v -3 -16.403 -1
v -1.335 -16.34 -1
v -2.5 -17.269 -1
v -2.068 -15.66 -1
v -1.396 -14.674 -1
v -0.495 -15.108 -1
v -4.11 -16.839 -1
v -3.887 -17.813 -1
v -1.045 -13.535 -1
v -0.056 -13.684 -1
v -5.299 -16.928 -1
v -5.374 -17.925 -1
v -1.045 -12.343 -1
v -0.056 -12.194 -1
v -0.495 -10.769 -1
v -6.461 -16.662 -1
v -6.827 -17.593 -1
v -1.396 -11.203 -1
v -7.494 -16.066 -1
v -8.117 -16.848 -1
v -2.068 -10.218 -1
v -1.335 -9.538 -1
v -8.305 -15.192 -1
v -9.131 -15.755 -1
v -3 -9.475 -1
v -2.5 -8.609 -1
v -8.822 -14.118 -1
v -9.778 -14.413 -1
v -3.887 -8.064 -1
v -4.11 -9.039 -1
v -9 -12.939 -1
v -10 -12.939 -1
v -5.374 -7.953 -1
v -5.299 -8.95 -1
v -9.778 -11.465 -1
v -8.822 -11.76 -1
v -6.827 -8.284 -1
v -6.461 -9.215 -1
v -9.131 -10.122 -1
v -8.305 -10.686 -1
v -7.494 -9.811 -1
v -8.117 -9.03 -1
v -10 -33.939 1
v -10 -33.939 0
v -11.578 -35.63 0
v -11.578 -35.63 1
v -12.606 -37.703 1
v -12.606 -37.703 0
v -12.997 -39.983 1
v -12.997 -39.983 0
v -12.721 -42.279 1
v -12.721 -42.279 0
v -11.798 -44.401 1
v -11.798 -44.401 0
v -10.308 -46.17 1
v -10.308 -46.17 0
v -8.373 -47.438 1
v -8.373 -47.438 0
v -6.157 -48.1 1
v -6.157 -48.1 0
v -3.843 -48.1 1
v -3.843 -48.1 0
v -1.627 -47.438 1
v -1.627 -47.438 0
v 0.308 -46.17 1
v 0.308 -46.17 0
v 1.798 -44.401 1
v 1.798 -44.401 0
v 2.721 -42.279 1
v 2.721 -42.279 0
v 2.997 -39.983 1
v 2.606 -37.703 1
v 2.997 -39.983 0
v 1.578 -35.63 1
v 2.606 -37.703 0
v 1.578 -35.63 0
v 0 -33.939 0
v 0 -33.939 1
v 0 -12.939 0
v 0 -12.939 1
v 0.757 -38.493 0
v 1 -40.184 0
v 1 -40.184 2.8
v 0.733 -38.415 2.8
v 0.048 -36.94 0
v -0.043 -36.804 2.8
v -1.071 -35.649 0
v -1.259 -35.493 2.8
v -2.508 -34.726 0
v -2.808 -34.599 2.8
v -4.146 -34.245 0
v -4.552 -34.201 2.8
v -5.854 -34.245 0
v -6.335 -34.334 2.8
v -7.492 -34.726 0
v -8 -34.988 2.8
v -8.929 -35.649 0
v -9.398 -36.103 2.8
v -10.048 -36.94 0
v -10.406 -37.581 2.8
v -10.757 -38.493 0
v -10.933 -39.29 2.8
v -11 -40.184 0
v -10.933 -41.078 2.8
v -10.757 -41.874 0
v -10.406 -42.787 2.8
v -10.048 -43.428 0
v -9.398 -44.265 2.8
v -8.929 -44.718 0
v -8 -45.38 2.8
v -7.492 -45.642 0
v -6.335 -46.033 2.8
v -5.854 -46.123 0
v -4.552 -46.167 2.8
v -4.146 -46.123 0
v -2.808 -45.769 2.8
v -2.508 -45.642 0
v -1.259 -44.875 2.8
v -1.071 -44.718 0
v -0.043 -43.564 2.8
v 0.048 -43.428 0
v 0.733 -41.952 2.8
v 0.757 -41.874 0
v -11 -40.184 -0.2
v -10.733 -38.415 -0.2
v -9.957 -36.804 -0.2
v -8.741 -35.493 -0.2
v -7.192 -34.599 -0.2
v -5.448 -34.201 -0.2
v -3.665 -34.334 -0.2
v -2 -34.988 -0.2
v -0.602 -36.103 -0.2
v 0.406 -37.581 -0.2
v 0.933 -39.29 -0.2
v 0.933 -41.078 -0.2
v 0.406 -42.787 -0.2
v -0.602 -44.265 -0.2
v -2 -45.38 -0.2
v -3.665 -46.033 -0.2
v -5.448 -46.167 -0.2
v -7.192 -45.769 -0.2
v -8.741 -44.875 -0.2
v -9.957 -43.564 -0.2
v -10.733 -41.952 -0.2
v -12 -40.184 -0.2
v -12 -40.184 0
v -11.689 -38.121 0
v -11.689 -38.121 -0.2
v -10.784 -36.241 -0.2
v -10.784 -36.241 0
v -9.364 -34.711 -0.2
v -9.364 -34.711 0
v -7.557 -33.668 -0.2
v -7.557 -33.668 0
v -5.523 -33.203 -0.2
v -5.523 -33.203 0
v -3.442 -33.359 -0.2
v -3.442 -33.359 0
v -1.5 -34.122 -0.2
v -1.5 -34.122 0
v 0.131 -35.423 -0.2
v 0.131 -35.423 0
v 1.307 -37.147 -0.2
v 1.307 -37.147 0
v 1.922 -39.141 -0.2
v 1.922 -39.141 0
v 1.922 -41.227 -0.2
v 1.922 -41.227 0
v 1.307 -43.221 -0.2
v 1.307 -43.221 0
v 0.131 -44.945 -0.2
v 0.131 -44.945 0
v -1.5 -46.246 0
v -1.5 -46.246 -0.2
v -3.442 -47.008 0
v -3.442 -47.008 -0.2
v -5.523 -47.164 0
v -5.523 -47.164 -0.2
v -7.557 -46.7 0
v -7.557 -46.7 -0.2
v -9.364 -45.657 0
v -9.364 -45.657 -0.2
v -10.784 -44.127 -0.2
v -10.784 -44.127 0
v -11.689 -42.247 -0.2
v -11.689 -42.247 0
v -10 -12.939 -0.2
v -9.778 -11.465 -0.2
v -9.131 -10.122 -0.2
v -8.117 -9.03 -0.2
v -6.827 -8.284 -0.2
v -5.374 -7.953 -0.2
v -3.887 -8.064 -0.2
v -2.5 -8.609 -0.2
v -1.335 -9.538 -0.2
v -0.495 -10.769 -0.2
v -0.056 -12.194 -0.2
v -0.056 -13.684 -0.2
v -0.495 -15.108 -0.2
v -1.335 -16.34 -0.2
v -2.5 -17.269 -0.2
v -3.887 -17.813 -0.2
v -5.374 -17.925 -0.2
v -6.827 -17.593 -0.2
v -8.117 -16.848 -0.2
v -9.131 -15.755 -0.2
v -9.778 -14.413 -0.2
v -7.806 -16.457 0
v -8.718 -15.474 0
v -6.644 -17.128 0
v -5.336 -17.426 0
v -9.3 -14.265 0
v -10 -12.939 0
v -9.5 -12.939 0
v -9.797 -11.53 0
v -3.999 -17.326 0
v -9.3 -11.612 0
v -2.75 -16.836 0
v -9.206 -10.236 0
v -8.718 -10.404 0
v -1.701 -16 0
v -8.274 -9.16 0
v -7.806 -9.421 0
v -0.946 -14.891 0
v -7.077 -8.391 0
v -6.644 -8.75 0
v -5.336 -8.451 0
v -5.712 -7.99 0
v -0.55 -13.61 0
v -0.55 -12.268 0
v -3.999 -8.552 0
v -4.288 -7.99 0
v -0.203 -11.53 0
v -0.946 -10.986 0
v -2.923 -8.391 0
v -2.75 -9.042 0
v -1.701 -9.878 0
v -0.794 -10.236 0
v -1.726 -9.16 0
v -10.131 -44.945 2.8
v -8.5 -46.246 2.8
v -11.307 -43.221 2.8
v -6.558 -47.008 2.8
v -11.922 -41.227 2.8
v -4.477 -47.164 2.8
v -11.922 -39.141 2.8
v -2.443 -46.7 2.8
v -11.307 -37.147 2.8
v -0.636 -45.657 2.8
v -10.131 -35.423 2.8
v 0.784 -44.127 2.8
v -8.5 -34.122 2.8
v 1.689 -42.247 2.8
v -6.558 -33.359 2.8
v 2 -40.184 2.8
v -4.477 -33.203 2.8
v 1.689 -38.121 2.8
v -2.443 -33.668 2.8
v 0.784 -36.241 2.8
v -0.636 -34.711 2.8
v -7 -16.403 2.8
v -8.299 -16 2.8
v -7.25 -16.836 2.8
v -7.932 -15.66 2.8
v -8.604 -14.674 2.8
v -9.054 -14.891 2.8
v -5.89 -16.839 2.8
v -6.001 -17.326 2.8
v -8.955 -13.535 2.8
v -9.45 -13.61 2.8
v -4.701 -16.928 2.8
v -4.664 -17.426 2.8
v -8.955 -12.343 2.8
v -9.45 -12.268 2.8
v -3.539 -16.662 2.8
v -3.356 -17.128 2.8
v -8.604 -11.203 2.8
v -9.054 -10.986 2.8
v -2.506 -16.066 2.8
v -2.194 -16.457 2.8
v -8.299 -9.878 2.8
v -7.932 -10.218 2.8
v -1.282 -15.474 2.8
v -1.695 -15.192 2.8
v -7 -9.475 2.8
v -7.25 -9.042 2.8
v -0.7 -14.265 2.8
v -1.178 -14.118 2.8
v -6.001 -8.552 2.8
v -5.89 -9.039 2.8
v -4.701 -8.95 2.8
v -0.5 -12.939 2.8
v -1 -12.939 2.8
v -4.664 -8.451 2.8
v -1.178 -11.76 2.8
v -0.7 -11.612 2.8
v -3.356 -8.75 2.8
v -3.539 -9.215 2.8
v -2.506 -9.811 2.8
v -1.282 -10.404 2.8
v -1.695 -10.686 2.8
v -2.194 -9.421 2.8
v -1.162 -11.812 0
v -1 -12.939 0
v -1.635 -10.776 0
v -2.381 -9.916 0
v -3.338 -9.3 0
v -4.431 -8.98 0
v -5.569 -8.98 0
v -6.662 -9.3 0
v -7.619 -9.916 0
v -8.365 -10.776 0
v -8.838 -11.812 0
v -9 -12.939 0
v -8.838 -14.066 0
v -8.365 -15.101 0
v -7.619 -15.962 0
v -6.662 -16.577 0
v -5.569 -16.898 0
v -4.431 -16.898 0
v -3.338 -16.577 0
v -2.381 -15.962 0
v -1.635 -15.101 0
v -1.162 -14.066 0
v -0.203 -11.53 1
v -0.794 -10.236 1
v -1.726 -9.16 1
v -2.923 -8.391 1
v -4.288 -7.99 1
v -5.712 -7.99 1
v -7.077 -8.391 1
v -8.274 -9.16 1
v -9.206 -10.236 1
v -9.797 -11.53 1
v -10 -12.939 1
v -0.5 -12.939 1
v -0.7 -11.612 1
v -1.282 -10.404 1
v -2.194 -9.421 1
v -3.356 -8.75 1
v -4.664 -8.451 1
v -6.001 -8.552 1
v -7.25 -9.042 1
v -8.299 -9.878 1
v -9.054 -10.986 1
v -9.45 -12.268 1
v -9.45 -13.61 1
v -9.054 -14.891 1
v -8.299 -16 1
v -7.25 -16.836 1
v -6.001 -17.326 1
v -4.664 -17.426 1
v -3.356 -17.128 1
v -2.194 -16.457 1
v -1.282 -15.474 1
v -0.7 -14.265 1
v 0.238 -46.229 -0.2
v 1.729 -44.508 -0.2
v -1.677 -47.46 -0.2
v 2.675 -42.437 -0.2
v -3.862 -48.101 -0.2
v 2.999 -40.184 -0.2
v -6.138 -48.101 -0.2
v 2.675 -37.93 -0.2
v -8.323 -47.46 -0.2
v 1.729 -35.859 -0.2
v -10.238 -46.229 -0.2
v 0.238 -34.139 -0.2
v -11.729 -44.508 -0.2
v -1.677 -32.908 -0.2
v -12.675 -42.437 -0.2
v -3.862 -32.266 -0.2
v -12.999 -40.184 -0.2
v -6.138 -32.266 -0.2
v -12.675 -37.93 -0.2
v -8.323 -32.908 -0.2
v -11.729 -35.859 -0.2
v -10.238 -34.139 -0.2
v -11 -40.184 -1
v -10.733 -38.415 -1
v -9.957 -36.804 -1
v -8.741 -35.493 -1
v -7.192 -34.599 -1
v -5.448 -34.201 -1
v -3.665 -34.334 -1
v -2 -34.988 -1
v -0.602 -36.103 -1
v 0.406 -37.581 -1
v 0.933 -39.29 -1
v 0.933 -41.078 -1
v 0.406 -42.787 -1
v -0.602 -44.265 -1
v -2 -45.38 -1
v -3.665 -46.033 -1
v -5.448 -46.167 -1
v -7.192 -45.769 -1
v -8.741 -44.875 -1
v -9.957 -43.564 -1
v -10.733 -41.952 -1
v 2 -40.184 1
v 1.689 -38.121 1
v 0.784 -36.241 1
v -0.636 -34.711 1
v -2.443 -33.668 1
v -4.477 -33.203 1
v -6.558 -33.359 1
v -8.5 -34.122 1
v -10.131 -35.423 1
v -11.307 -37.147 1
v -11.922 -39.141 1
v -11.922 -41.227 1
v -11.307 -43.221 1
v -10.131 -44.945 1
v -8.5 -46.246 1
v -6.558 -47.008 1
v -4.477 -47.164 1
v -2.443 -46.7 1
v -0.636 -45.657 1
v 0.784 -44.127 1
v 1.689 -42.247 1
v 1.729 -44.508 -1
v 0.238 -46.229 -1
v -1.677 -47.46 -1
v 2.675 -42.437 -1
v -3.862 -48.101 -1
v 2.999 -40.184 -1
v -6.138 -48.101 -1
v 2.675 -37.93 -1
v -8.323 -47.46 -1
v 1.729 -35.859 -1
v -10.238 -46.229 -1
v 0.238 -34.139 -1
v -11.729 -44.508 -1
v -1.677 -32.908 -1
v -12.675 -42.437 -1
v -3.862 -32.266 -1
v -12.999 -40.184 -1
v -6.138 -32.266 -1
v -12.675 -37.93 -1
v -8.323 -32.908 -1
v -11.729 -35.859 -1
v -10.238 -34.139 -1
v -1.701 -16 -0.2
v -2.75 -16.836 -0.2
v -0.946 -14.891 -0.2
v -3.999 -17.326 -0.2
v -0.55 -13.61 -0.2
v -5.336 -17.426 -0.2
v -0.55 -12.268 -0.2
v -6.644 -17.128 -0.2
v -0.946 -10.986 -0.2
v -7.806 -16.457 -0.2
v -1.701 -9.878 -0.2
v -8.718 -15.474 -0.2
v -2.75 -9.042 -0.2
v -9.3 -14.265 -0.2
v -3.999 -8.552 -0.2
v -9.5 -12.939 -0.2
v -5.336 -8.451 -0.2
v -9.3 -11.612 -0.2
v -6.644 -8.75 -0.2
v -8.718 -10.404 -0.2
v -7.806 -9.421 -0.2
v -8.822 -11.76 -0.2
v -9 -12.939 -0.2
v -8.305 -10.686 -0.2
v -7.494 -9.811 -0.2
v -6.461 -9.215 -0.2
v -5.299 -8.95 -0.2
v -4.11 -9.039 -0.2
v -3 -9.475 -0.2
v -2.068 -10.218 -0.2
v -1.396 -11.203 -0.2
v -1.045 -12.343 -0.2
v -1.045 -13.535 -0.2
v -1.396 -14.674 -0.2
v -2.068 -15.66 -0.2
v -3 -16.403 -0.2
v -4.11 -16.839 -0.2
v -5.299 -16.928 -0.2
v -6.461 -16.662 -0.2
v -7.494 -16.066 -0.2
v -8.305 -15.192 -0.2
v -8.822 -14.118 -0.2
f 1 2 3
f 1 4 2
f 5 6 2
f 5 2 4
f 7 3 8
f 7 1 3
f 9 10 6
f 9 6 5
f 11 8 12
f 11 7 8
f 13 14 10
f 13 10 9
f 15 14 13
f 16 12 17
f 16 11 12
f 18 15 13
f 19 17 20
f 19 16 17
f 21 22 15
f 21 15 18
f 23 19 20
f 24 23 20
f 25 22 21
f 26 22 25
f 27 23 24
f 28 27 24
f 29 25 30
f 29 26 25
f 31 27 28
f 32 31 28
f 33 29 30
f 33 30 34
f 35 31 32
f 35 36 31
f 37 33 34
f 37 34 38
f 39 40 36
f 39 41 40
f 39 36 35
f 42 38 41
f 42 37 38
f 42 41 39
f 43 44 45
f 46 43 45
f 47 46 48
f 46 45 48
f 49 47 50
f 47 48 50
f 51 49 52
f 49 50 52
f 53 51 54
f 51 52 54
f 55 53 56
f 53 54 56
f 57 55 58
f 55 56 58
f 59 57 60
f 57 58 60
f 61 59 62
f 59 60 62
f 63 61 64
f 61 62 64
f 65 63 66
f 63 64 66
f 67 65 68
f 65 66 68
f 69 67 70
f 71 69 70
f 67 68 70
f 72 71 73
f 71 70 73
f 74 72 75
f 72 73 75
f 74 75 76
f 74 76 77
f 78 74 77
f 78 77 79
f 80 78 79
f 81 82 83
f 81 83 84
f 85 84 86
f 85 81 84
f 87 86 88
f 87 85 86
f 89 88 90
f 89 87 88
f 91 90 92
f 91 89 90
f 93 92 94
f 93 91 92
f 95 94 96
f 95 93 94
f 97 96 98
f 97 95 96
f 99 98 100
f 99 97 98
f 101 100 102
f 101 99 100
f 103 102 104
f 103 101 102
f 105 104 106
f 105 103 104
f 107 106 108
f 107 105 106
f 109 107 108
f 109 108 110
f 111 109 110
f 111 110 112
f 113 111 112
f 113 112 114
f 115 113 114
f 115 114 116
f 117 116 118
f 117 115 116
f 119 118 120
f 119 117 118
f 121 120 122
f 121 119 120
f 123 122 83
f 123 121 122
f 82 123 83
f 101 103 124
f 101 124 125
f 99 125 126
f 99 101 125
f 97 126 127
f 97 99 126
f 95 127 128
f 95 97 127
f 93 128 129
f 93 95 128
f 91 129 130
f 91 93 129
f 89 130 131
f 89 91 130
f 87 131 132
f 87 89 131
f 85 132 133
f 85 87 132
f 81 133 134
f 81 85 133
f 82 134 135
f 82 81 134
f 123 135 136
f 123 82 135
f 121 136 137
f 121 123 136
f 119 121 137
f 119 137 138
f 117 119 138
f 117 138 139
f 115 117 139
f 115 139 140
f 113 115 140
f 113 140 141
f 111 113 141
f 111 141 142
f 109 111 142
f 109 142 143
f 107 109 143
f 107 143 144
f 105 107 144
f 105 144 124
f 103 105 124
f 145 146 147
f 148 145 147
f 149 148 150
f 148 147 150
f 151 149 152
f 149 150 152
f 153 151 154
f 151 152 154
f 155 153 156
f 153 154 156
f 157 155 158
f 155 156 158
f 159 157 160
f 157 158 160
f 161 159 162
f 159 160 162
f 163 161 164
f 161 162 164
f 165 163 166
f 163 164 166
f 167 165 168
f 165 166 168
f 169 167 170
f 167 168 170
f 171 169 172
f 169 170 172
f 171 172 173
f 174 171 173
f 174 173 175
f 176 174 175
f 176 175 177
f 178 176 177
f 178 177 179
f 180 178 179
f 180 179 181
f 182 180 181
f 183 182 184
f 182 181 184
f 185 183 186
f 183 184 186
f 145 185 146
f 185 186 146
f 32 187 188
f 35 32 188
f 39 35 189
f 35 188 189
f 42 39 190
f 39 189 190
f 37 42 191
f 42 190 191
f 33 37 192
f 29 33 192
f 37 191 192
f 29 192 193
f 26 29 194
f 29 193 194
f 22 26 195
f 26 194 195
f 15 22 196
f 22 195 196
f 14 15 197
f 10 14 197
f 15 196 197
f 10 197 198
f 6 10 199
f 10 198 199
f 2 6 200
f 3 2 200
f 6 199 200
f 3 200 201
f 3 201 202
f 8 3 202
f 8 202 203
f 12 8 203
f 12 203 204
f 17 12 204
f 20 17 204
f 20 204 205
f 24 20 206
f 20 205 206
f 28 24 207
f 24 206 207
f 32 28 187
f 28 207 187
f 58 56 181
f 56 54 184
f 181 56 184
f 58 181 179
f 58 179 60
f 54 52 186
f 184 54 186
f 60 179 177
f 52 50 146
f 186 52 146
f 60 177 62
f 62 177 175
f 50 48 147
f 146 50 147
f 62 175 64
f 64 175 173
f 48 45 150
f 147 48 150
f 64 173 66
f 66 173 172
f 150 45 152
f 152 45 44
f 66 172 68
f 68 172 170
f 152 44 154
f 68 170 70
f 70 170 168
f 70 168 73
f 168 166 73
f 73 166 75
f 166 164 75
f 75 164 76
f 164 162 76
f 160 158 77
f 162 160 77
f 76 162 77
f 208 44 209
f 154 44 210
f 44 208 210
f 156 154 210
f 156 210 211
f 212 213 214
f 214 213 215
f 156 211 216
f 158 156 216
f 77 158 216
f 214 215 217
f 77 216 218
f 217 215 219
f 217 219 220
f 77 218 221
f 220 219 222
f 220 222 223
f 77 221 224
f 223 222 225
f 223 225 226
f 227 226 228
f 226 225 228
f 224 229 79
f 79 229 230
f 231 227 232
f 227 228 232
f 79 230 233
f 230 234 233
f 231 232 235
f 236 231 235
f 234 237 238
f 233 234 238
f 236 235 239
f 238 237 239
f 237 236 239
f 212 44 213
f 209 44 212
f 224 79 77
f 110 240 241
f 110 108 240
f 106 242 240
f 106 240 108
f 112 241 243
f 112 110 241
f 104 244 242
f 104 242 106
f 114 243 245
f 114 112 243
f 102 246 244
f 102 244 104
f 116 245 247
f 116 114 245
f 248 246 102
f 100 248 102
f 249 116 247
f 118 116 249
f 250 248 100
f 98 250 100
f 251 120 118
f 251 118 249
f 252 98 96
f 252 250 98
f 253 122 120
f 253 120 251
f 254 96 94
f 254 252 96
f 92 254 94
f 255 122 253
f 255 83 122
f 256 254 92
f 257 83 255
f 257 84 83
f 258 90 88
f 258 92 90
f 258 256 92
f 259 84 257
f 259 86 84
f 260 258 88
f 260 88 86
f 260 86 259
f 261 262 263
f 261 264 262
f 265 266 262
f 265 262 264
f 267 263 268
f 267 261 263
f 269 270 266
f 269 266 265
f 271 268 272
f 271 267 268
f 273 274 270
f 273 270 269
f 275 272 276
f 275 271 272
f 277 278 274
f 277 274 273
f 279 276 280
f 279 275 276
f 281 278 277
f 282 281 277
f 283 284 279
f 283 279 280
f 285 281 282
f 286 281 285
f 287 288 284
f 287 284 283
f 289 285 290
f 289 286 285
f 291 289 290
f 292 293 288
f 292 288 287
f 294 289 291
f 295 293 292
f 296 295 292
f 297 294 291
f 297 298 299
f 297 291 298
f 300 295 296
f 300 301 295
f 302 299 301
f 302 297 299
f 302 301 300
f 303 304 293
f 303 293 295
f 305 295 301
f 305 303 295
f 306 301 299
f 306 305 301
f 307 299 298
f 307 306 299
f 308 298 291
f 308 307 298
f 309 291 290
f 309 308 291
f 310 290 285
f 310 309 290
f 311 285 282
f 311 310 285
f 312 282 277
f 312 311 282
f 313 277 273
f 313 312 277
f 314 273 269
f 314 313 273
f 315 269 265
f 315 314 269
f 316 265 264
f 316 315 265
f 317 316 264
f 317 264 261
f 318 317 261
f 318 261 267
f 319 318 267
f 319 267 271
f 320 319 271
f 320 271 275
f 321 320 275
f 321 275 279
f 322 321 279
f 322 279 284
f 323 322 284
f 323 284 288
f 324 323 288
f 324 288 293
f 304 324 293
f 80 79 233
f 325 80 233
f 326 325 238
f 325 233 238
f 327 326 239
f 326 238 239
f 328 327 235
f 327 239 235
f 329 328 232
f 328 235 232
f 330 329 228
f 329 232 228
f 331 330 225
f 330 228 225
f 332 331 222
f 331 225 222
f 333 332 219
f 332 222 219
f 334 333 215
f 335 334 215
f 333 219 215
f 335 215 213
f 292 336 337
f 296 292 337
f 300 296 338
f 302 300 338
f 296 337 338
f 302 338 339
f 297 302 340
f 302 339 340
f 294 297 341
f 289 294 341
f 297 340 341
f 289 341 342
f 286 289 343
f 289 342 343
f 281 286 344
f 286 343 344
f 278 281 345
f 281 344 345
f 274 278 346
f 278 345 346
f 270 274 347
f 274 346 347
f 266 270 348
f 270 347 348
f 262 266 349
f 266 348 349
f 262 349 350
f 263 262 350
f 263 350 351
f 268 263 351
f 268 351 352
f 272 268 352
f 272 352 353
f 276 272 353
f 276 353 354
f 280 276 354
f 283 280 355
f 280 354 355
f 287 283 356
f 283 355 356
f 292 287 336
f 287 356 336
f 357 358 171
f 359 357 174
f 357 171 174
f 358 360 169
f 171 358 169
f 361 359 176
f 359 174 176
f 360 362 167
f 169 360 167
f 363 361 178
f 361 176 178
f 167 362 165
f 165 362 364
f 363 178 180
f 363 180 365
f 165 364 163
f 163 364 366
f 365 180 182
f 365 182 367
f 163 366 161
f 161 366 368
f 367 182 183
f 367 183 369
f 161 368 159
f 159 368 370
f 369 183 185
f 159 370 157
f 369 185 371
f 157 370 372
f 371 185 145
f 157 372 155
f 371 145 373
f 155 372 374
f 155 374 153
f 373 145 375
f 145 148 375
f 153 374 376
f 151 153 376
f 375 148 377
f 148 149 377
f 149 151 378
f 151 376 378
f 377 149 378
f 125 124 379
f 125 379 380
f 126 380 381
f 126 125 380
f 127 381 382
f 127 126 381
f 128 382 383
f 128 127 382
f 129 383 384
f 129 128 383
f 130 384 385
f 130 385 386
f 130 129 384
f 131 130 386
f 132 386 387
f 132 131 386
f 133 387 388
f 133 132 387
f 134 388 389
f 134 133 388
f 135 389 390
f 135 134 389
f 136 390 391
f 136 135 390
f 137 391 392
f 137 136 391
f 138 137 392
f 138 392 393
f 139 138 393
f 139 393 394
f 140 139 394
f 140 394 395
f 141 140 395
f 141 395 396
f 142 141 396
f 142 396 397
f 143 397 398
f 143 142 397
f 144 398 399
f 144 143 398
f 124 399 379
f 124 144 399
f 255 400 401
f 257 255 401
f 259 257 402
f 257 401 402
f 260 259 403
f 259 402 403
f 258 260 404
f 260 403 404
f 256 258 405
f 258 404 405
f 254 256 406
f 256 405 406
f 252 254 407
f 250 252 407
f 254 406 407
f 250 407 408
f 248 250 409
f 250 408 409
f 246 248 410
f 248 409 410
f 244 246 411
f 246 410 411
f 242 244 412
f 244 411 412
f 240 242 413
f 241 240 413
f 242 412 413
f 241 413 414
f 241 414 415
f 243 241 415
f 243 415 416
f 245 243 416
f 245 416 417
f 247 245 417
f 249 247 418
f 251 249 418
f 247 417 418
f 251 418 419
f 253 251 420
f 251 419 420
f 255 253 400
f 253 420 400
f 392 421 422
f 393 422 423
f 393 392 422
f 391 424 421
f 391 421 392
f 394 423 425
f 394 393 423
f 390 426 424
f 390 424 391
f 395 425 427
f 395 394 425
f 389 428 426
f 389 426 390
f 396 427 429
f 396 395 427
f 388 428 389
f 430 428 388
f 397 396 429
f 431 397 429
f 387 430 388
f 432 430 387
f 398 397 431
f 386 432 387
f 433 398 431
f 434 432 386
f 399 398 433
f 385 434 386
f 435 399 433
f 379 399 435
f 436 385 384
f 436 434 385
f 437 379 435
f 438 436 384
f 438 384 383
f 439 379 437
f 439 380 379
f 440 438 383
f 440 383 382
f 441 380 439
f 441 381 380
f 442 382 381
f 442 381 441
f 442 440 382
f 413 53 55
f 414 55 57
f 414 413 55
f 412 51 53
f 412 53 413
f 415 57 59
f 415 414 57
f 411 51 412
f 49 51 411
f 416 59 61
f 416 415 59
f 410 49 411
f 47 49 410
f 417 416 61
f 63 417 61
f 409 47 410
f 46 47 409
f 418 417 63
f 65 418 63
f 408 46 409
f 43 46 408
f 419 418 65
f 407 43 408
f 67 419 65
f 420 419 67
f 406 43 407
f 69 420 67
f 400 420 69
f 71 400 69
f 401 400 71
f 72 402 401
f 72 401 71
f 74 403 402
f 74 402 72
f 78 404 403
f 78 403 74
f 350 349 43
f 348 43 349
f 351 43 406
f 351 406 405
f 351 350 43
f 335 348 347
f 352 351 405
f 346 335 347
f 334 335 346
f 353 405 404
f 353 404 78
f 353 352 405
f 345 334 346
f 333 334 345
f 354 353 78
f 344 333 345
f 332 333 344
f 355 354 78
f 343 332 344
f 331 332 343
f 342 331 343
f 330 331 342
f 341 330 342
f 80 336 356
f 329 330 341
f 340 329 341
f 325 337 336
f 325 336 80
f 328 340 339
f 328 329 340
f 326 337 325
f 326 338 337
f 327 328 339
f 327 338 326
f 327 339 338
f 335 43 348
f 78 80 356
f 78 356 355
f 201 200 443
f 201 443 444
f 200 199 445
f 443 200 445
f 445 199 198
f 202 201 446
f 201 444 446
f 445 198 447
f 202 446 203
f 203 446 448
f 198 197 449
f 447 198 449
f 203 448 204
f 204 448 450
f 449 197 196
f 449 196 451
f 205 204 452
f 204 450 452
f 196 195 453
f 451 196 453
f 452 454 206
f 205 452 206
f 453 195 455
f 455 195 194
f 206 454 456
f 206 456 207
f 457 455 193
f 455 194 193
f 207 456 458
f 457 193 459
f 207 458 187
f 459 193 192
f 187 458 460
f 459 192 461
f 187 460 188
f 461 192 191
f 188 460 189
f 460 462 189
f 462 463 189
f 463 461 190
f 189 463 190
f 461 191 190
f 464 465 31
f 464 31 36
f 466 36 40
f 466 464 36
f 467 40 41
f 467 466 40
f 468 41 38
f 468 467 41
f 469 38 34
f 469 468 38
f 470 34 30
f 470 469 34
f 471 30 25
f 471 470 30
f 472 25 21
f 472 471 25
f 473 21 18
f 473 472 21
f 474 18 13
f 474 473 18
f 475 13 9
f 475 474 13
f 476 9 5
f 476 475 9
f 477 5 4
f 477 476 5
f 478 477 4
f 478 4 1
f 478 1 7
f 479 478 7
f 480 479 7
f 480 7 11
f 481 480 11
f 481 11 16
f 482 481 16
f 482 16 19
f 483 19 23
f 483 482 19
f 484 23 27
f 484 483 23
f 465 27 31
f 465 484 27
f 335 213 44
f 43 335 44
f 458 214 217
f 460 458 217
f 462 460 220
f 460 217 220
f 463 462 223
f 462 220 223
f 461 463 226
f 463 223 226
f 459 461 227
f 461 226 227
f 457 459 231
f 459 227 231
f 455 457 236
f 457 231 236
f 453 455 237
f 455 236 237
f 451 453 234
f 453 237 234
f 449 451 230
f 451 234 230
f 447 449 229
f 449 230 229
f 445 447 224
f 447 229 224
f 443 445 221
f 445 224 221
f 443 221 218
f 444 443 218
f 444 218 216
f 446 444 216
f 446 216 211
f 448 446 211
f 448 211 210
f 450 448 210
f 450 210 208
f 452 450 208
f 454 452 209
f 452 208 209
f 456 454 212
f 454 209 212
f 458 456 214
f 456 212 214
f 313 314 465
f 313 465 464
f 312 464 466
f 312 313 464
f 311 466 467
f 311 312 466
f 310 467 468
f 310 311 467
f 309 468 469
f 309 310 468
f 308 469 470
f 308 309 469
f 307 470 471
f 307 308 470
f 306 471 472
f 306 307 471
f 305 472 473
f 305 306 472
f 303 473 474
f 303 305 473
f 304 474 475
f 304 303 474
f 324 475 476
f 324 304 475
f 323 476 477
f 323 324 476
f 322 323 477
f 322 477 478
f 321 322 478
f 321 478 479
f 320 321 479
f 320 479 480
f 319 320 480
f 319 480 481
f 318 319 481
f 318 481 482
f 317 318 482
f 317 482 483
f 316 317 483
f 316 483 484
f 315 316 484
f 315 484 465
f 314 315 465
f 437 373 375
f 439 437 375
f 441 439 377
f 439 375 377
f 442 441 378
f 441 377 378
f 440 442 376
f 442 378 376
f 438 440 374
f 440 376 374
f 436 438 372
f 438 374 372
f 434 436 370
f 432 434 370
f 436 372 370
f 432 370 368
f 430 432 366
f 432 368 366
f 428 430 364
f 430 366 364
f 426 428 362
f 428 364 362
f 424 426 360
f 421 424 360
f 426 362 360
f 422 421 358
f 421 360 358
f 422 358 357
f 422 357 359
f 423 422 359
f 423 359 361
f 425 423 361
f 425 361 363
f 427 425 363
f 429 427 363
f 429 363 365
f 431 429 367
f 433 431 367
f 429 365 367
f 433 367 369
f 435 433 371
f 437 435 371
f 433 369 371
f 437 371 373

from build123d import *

# Parameters (mm, degrees)
CROQUIS1_R              = 6
CROQUIS1_R_2            = 4
SALIENTE_EXTRUIR1_DEPTH = 1
CROQUIS2_R              = 7
CROQUIS2_R_2            = 6
CROQUIS2_R_3            = 4.5
CROQUIS2_R_4            = 4
SALIENTE_EXTRUIR2_DEPTH = 1.8
CROQUIS3_R              = 7
CROQUIS3_R_2            = 6
CROQUIS3_R_3            = 4.5
CROQUIS3_R_4            = 4
SALIENTE_EXTRUIR3_DEPTH = 0.2
CROQUIS4_R              = 7.99896204
CROQUIS4_R_2            = 6
CROQUIS4_R_3            = 5
CROQUIS4_R_4            = 4
SALIENTE_EXTRUIR4_DEPTH = 0.8


with BuildPart() as part:
    # Croquis1 → Saliente-Extruir1 (new body)
    with BuildSketch(Plane.XY):
        with BuildLine():
            Line((-10, -12.938825758), (-10, -33.938825758))
            ThreePointArc((-10, -33.938825758), (-5, -48.183823756), (0, -33.938825758))
            Line((0, -33.938825758), (0, -12.938825758))
            ThreePointArc((0, -12.938825758), (-5, -7.938825758), (-10, -12.938825758))
        make_face()
        with Locations((-5, -40.183823756)):
            Circle(CROQUIS1_R, mode=Mode.SUBTRACT)
        with Locations((-5, -12.938825758)):
            Circle(CROQUIS1_R_2, mode=Mode.SUBTRACT)
    extrude(amount=SALIENTE_EXTRUIR1_DEPTH)

    # Croquis2 → Saliente-Extruir2 (add)
    with BuildSketch(Plane.XY.offset(1)):
        with Locations((-5, -40.183823756)):
            Circle(CROQUIS2_R)
        with Locations((-5, -40.183823756)):
            Circle(CROQUIS2_R_2, mode=Mode.SUBTRACT)
        with Locations((-5, -12.938825758)):
            Circle(CROQUIS2_R_3)
        with Locations((-5, -12.938825758)):
            Circle(CROQUIS2_R_4, mode=Mode.SUBTRACT)
    extrude(amount=SALIENTE_EXTRUIR2_DEPTH)

    # Croquis3 → Saliente-Extruir3 (add)
    with BuildSketch(Plane(origin=(0, 0, 0), x_dir=(-1, 0, 0), z_dir=(0, 0, -1))):
        with Locations((5, -40.183823756)):
            Circle(CROQUIS3_R)
        with Locations((5, -40.183823756)):
            Circle(CROQUIS3_R_2, mode=Mode.SUBTRACT)
        with Locations((5, -12.938825758)):
            Circle(CROQUIS3_R_3)
        with Locations((5, -12.938825758)):
            Circle(CROQUIS3_R_4, mode=Mode.SUBTRACT)
    extrude(amount=SALIENTE_EXTRUIR3_DEPTH)

    # Croquis4 → Saliente-Extruir4 (add)
    with BuildSketch(Plane(origin=(0, 0, -0.2), x_dir=(-1, 0, 0), z_dir=(0, 0, -1))):
        with Locations((5, -40.183823756)):
            Circle(CROQUIS4_R)
        with Locations((5, -40.183823756)):
            Circle(CROQUIS4_R_2, mode=Mode.SUBTRACT)
        with Locations((5, -12.938825758)):
            Circle(CROQUIS4_R_3)
        with Locations((5, -12.938825758)):
            Circle(CROQUIS4_R_4, mode=Mode.SUBTRACT)
    extrude(amount=SALIENTE_EXTRUIR4_DEPTH)


solid = part.part
